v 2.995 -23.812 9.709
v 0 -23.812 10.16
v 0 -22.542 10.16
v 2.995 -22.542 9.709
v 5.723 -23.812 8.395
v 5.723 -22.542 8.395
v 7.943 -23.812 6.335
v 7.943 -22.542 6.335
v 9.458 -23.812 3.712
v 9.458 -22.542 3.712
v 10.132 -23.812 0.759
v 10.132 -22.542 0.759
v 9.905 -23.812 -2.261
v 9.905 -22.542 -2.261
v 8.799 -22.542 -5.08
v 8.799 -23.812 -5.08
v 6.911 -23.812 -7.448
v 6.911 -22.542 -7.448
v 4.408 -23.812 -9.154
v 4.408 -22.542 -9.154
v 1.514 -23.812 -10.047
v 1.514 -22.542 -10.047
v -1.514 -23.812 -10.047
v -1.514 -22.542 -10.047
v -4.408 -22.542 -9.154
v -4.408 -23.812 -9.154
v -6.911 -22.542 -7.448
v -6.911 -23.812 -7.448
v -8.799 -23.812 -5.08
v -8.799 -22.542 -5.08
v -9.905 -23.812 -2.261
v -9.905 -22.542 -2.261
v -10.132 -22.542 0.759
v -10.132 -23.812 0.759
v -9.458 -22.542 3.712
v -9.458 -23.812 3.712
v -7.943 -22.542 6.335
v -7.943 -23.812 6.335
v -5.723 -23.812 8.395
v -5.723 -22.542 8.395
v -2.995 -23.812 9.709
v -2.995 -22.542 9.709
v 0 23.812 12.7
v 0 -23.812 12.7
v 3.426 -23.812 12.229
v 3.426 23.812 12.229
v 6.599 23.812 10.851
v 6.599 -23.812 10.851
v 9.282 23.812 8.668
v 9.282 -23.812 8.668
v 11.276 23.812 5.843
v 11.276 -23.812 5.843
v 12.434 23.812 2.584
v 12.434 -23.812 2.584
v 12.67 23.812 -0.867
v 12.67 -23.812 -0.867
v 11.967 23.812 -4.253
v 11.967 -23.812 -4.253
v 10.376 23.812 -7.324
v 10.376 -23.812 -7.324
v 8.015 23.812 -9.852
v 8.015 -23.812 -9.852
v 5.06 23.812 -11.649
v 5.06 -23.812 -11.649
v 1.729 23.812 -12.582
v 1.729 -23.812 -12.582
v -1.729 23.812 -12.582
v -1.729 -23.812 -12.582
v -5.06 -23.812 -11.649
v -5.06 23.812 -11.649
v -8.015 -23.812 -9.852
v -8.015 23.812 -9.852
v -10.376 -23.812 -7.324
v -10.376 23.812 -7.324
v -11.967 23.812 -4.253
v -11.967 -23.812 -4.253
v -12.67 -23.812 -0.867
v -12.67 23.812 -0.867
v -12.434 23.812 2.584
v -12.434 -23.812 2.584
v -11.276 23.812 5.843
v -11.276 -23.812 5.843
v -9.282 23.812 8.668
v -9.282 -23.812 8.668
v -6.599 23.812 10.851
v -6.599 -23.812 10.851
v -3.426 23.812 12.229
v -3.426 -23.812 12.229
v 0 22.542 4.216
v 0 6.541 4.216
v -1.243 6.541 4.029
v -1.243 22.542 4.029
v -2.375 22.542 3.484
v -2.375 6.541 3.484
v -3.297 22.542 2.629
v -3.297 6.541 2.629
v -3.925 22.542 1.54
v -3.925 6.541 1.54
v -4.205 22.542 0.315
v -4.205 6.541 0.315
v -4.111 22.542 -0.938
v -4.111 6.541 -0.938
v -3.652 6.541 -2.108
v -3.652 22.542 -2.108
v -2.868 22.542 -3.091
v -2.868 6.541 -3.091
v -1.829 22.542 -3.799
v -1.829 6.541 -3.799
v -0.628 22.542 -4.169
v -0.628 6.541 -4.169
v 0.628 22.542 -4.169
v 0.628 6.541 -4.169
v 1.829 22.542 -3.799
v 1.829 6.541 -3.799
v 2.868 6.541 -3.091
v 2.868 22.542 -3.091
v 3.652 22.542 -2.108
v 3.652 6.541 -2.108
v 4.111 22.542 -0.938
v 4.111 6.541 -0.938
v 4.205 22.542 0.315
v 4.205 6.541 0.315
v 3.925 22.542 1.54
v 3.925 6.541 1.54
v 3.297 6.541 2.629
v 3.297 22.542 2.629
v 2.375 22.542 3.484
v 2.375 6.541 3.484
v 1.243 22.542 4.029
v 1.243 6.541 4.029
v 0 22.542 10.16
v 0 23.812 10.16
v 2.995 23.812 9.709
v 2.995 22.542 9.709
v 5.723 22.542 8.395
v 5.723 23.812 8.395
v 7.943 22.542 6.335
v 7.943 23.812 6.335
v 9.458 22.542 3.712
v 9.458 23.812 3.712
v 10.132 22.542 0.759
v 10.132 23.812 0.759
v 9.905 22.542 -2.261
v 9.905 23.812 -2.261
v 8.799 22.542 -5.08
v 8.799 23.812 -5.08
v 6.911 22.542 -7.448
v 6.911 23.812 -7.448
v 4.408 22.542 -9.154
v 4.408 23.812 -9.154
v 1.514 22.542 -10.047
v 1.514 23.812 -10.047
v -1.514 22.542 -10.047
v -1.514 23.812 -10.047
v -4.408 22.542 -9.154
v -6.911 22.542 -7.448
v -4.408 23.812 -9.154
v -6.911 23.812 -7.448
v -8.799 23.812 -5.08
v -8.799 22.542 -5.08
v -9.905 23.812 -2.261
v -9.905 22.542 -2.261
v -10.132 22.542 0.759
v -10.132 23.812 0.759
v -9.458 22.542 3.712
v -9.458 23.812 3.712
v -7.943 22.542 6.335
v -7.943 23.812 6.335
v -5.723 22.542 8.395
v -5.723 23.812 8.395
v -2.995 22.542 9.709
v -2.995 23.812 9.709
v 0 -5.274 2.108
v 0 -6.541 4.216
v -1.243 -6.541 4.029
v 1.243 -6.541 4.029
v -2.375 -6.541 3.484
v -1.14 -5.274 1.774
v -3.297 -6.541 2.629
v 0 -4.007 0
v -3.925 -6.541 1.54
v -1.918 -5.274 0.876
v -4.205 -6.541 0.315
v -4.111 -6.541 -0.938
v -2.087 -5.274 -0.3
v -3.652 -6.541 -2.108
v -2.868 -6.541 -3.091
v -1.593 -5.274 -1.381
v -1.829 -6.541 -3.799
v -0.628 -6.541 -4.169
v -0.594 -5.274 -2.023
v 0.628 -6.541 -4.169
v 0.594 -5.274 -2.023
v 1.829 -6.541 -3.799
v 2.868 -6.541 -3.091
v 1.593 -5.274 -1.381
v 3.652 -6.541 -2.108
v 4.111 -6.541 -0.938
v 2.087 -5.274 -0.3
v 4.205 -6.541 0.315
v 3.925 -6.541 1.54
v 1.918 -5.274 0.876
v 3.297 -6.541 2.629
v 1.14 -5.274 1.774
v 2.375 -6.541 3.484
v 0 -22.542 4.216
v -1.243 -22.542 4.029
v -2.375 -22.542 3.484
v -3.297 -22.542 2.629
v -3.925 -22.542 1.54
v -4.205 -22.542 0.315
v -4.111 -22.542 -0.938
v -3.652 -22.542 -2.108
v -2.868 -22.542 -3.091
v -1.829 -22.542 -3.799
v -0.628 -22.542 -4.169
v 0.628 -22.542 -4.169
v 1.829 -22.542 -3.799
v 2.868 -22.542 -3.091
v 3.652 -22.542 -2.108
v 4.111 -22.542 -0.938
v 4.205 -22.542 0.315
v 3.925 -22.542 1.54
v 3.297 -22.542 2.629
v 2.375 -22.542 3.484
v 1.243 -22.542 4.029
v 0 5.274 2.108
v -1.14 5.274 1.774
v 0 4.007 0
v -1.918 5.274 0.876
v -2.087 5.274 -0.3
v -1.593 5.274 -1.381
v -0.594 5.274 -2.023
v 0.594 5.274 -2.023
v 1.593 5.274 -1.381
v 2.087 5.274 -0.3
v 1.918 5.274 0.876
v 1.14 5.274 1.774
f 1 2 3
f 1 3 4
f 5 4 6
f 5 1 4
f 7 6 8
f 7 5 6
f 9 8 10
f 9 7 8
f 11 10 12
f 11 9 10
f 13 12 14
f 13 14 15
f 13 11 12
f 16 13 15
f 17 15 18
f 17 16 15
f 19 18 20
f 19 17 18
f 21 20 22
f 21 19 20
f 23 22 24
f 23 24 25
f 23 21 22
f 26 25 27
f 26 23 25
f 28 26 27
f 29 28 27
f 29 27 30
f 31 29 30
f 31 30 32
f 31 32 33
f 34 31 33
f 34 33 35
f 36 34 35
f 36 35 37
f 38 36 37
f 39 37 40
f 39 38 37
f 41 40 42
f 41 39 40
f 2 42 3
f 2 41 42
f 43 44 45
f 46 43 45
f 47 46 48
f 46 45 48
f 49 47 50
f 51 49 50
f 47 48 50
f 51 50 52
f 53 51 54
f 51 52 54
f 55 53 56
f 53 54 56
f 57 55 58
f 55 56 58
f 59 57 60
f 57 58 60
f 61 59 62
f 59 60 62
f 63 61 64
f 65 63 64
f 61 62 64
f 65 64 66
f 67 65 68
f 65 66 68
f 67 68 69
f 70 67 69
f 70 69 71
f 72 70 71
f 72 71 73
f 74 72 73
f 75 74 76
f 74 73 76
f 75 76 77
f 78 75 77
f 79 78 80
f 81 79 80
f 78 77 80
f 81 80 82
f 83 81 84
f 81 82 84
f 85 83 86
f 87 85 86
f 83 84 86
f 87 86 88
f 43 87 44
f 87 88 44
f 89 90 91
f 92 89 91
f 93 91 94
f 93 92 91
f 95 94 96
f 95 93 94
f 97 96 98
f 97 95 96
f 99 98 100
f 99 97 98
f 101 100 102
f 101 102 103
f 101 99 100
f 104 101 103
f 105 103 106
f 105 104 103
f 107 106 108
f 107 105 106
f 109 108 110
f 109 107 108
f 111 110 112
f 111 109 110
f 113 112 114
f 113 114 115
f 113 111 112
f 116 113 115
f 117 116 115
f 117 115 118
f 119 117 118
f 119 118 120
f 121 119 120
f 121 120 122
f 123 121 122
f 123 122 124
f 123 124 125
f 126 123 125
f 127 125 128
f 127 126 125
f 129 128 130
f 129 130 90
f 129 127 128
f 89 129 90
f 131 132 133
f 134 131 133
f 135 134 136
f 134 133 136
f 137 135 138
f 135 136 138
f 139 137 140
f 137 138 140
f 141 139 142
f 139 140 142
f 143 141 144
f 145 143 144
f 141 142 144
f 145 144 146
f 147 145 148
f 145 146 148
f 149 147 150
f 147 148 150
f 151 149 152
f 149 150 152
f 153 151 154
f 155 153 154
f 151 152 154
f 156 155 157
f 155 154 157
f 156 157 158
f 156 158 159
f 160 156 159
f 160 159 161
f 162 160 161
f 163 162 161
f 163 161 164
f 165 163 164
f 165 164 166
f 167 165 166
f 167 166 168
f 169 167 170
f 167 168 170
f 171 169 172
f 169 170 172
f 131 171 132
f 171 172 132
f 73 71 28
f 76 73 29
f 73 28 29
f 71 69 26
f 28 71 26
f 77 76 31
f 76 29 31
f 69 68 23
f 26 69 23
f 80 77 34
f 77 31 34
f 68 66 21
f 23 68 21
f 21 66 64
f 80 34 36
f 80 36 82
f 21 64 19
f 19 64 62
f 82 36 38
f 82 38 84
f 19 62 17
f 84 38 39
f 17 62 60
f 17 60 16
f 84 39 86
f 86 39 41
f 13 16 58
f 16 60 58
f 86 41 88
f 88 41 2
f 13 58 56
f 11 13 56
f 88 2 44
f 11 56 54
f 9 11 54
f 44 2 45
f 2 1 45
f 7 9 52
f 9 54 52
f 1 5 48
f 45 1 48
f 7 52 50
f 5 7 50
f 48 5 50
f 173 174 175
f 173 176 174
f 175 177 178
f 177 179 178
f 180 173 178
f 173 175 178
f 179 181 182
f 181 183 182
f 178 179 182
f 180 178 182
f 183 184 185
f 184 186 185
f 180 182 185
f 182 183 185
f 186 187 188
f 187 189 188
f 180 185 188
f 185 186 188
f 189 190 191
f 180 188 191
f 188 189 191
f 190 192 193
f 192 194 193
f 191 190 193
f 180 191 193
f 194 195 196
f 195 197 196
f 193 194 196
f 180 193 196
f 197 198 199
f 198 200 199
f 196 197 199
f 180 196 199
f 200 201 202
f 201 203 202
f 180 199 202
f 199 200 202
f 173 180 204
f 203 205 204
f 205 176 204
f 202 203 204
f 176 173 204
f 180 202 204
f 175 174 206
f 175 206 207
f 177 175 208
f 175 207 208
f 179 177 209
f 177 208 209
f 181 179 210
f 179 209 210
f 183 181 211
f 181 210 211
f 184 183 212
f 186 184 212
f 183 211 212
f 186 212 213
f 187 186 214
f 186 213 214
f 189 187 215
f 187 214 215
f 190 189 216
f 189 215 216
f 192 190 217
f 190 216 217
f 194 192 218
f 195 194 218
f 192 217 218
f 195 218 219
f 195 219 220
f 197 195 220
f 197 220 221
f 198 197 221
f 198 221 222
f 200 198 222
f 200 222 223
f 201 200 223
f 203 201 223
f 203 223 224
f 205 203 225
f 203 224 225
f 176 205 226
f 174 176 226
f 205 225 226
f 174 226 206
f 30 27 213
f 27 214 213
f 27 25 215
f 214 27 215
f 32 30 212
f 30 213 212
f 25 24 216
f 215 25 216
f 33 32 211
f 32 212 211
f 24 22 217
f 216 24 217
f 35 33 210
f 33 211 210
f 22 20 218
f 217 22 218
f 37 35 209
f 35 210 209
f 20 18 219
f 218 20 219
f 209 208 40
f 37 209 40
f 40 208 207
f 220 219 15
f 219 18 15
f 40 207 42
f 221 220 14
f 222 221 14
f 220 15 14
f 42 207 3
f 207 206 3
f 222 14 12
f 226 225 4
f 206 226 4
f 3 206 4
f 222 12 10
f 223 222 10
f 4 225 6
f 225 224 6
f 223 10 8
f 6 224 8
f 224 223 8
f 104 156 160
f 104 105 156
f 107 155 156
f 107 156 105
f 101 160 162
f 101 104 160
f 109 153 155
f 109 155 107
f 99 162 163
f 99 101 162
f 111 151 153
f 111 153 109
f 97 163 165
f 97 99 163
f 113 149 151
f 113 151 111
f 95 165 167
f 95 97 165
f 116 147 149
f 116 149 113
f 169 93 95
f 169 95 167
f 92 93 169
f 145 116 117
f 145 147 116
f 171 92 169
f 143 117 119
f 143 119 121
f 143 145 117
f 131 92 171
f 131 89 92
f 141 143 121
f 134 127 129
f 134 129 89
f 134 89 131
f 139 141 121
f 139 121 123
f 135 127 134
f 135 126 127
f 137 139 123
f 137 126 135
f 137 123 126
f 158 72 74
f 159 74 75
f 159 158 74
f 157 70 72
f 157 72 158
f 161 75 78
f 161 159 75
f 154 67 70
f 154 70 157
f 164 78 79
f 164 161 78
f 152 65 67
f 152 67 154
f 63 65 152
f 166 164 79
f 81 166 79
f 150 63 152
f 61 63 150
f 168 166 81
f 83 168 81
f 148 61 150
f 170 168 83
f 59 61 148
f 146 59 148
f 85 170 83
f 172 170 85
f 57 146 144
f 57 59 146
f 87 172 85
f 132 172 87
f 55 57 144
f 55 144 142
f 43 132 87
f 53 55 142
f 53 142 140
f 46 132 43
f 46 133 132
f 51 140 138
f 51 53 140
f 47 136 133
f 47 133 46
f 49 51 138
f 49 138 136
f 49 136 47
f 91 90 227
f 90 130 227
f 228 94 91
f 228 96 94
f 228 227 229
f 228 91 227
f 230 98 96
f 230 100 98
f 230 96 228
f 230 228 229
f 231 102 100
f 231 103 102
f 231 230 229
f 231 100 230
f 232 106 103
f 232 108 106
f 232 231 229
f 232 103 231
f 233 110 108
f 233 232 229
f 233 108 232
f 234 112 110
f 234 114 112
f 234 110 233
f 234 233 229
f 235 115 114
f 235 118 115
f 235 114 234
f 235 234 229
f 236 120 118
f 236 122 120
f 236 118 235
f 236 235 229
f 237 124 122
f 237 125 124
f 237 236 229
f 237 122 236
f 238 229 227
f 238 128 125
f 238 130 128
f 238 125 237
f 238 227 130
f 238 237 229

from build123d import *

# Parameters (mm, degrees)
BOSS_EXTRUDE1_DEPTH      = 23.8125
BOSS_EXTRUDE1_DEPTH_BACK = 23.8125
SKETCH1_R                = 12.7
SKETCH2_R                = 10.16
CUT_EXTRUDE1_DEPTH       = 1.27


with BuildPart() as part:
    # Sketch1 → Boss-Extrude1 (new, two sides: drawn at the far end of the back side and taken through both)
    with BuildSketch(Plane(origin=(0, 0, 0), x_dir=(1, 0, 0), z_dir=(0, 1, 0)).offset(-BOSS_EXTRUDE1_DEPTH_BACK)):
        Circle(SKETCH1_R)
    extrude(amount=BOSS_EXTRUDE1_DEPTH + BOSS_EXTRUDE1_DEPTH_BACK)

    # Sketch2 → Cut-Extrude1 (cut)
    with BuildSketch(Plane(origin=(0, 23.8125, 0), x_dir=(1, 0, 0), z_dir=(0, 1, 0))):
        Circle(SKETCH2_R)
    cut_extrude1 = extrude(amount=-CUT_EXTRUDE1_DEPTH, mode=Mode.SUBTRACT)

    # Sketch5 → 3/8-24 Tapped Hole1 (revolve, cut)
    with BuildSketch(Plane(origin=(0, 22.5425, 0), x_dir=(0, 0, 1), z_dir=(1, 0, 0))):
        Polygon((0, 0), (0, 18.535468714), (4.2164, 16.002), (4.2164, 0), align=None)
    f_3_8_24_tapped_hole1 = revolve(axis=Axis((0, 28.8925, 0), (0, -1, 0)), mode=Mode.SUBTRACT)

    # Mirror1: Cut-Extrude1, 3/8-24 Tapped Hole1 across plane
    add(cut_extrude1.mirror(Plane.ZX), mode=Mode.SUBTRACT)
    add(f_3_8_24_tapped_hole1.mirror(Plane.ZX), mode=Mode.SUBTRACT)


solid = part.part
